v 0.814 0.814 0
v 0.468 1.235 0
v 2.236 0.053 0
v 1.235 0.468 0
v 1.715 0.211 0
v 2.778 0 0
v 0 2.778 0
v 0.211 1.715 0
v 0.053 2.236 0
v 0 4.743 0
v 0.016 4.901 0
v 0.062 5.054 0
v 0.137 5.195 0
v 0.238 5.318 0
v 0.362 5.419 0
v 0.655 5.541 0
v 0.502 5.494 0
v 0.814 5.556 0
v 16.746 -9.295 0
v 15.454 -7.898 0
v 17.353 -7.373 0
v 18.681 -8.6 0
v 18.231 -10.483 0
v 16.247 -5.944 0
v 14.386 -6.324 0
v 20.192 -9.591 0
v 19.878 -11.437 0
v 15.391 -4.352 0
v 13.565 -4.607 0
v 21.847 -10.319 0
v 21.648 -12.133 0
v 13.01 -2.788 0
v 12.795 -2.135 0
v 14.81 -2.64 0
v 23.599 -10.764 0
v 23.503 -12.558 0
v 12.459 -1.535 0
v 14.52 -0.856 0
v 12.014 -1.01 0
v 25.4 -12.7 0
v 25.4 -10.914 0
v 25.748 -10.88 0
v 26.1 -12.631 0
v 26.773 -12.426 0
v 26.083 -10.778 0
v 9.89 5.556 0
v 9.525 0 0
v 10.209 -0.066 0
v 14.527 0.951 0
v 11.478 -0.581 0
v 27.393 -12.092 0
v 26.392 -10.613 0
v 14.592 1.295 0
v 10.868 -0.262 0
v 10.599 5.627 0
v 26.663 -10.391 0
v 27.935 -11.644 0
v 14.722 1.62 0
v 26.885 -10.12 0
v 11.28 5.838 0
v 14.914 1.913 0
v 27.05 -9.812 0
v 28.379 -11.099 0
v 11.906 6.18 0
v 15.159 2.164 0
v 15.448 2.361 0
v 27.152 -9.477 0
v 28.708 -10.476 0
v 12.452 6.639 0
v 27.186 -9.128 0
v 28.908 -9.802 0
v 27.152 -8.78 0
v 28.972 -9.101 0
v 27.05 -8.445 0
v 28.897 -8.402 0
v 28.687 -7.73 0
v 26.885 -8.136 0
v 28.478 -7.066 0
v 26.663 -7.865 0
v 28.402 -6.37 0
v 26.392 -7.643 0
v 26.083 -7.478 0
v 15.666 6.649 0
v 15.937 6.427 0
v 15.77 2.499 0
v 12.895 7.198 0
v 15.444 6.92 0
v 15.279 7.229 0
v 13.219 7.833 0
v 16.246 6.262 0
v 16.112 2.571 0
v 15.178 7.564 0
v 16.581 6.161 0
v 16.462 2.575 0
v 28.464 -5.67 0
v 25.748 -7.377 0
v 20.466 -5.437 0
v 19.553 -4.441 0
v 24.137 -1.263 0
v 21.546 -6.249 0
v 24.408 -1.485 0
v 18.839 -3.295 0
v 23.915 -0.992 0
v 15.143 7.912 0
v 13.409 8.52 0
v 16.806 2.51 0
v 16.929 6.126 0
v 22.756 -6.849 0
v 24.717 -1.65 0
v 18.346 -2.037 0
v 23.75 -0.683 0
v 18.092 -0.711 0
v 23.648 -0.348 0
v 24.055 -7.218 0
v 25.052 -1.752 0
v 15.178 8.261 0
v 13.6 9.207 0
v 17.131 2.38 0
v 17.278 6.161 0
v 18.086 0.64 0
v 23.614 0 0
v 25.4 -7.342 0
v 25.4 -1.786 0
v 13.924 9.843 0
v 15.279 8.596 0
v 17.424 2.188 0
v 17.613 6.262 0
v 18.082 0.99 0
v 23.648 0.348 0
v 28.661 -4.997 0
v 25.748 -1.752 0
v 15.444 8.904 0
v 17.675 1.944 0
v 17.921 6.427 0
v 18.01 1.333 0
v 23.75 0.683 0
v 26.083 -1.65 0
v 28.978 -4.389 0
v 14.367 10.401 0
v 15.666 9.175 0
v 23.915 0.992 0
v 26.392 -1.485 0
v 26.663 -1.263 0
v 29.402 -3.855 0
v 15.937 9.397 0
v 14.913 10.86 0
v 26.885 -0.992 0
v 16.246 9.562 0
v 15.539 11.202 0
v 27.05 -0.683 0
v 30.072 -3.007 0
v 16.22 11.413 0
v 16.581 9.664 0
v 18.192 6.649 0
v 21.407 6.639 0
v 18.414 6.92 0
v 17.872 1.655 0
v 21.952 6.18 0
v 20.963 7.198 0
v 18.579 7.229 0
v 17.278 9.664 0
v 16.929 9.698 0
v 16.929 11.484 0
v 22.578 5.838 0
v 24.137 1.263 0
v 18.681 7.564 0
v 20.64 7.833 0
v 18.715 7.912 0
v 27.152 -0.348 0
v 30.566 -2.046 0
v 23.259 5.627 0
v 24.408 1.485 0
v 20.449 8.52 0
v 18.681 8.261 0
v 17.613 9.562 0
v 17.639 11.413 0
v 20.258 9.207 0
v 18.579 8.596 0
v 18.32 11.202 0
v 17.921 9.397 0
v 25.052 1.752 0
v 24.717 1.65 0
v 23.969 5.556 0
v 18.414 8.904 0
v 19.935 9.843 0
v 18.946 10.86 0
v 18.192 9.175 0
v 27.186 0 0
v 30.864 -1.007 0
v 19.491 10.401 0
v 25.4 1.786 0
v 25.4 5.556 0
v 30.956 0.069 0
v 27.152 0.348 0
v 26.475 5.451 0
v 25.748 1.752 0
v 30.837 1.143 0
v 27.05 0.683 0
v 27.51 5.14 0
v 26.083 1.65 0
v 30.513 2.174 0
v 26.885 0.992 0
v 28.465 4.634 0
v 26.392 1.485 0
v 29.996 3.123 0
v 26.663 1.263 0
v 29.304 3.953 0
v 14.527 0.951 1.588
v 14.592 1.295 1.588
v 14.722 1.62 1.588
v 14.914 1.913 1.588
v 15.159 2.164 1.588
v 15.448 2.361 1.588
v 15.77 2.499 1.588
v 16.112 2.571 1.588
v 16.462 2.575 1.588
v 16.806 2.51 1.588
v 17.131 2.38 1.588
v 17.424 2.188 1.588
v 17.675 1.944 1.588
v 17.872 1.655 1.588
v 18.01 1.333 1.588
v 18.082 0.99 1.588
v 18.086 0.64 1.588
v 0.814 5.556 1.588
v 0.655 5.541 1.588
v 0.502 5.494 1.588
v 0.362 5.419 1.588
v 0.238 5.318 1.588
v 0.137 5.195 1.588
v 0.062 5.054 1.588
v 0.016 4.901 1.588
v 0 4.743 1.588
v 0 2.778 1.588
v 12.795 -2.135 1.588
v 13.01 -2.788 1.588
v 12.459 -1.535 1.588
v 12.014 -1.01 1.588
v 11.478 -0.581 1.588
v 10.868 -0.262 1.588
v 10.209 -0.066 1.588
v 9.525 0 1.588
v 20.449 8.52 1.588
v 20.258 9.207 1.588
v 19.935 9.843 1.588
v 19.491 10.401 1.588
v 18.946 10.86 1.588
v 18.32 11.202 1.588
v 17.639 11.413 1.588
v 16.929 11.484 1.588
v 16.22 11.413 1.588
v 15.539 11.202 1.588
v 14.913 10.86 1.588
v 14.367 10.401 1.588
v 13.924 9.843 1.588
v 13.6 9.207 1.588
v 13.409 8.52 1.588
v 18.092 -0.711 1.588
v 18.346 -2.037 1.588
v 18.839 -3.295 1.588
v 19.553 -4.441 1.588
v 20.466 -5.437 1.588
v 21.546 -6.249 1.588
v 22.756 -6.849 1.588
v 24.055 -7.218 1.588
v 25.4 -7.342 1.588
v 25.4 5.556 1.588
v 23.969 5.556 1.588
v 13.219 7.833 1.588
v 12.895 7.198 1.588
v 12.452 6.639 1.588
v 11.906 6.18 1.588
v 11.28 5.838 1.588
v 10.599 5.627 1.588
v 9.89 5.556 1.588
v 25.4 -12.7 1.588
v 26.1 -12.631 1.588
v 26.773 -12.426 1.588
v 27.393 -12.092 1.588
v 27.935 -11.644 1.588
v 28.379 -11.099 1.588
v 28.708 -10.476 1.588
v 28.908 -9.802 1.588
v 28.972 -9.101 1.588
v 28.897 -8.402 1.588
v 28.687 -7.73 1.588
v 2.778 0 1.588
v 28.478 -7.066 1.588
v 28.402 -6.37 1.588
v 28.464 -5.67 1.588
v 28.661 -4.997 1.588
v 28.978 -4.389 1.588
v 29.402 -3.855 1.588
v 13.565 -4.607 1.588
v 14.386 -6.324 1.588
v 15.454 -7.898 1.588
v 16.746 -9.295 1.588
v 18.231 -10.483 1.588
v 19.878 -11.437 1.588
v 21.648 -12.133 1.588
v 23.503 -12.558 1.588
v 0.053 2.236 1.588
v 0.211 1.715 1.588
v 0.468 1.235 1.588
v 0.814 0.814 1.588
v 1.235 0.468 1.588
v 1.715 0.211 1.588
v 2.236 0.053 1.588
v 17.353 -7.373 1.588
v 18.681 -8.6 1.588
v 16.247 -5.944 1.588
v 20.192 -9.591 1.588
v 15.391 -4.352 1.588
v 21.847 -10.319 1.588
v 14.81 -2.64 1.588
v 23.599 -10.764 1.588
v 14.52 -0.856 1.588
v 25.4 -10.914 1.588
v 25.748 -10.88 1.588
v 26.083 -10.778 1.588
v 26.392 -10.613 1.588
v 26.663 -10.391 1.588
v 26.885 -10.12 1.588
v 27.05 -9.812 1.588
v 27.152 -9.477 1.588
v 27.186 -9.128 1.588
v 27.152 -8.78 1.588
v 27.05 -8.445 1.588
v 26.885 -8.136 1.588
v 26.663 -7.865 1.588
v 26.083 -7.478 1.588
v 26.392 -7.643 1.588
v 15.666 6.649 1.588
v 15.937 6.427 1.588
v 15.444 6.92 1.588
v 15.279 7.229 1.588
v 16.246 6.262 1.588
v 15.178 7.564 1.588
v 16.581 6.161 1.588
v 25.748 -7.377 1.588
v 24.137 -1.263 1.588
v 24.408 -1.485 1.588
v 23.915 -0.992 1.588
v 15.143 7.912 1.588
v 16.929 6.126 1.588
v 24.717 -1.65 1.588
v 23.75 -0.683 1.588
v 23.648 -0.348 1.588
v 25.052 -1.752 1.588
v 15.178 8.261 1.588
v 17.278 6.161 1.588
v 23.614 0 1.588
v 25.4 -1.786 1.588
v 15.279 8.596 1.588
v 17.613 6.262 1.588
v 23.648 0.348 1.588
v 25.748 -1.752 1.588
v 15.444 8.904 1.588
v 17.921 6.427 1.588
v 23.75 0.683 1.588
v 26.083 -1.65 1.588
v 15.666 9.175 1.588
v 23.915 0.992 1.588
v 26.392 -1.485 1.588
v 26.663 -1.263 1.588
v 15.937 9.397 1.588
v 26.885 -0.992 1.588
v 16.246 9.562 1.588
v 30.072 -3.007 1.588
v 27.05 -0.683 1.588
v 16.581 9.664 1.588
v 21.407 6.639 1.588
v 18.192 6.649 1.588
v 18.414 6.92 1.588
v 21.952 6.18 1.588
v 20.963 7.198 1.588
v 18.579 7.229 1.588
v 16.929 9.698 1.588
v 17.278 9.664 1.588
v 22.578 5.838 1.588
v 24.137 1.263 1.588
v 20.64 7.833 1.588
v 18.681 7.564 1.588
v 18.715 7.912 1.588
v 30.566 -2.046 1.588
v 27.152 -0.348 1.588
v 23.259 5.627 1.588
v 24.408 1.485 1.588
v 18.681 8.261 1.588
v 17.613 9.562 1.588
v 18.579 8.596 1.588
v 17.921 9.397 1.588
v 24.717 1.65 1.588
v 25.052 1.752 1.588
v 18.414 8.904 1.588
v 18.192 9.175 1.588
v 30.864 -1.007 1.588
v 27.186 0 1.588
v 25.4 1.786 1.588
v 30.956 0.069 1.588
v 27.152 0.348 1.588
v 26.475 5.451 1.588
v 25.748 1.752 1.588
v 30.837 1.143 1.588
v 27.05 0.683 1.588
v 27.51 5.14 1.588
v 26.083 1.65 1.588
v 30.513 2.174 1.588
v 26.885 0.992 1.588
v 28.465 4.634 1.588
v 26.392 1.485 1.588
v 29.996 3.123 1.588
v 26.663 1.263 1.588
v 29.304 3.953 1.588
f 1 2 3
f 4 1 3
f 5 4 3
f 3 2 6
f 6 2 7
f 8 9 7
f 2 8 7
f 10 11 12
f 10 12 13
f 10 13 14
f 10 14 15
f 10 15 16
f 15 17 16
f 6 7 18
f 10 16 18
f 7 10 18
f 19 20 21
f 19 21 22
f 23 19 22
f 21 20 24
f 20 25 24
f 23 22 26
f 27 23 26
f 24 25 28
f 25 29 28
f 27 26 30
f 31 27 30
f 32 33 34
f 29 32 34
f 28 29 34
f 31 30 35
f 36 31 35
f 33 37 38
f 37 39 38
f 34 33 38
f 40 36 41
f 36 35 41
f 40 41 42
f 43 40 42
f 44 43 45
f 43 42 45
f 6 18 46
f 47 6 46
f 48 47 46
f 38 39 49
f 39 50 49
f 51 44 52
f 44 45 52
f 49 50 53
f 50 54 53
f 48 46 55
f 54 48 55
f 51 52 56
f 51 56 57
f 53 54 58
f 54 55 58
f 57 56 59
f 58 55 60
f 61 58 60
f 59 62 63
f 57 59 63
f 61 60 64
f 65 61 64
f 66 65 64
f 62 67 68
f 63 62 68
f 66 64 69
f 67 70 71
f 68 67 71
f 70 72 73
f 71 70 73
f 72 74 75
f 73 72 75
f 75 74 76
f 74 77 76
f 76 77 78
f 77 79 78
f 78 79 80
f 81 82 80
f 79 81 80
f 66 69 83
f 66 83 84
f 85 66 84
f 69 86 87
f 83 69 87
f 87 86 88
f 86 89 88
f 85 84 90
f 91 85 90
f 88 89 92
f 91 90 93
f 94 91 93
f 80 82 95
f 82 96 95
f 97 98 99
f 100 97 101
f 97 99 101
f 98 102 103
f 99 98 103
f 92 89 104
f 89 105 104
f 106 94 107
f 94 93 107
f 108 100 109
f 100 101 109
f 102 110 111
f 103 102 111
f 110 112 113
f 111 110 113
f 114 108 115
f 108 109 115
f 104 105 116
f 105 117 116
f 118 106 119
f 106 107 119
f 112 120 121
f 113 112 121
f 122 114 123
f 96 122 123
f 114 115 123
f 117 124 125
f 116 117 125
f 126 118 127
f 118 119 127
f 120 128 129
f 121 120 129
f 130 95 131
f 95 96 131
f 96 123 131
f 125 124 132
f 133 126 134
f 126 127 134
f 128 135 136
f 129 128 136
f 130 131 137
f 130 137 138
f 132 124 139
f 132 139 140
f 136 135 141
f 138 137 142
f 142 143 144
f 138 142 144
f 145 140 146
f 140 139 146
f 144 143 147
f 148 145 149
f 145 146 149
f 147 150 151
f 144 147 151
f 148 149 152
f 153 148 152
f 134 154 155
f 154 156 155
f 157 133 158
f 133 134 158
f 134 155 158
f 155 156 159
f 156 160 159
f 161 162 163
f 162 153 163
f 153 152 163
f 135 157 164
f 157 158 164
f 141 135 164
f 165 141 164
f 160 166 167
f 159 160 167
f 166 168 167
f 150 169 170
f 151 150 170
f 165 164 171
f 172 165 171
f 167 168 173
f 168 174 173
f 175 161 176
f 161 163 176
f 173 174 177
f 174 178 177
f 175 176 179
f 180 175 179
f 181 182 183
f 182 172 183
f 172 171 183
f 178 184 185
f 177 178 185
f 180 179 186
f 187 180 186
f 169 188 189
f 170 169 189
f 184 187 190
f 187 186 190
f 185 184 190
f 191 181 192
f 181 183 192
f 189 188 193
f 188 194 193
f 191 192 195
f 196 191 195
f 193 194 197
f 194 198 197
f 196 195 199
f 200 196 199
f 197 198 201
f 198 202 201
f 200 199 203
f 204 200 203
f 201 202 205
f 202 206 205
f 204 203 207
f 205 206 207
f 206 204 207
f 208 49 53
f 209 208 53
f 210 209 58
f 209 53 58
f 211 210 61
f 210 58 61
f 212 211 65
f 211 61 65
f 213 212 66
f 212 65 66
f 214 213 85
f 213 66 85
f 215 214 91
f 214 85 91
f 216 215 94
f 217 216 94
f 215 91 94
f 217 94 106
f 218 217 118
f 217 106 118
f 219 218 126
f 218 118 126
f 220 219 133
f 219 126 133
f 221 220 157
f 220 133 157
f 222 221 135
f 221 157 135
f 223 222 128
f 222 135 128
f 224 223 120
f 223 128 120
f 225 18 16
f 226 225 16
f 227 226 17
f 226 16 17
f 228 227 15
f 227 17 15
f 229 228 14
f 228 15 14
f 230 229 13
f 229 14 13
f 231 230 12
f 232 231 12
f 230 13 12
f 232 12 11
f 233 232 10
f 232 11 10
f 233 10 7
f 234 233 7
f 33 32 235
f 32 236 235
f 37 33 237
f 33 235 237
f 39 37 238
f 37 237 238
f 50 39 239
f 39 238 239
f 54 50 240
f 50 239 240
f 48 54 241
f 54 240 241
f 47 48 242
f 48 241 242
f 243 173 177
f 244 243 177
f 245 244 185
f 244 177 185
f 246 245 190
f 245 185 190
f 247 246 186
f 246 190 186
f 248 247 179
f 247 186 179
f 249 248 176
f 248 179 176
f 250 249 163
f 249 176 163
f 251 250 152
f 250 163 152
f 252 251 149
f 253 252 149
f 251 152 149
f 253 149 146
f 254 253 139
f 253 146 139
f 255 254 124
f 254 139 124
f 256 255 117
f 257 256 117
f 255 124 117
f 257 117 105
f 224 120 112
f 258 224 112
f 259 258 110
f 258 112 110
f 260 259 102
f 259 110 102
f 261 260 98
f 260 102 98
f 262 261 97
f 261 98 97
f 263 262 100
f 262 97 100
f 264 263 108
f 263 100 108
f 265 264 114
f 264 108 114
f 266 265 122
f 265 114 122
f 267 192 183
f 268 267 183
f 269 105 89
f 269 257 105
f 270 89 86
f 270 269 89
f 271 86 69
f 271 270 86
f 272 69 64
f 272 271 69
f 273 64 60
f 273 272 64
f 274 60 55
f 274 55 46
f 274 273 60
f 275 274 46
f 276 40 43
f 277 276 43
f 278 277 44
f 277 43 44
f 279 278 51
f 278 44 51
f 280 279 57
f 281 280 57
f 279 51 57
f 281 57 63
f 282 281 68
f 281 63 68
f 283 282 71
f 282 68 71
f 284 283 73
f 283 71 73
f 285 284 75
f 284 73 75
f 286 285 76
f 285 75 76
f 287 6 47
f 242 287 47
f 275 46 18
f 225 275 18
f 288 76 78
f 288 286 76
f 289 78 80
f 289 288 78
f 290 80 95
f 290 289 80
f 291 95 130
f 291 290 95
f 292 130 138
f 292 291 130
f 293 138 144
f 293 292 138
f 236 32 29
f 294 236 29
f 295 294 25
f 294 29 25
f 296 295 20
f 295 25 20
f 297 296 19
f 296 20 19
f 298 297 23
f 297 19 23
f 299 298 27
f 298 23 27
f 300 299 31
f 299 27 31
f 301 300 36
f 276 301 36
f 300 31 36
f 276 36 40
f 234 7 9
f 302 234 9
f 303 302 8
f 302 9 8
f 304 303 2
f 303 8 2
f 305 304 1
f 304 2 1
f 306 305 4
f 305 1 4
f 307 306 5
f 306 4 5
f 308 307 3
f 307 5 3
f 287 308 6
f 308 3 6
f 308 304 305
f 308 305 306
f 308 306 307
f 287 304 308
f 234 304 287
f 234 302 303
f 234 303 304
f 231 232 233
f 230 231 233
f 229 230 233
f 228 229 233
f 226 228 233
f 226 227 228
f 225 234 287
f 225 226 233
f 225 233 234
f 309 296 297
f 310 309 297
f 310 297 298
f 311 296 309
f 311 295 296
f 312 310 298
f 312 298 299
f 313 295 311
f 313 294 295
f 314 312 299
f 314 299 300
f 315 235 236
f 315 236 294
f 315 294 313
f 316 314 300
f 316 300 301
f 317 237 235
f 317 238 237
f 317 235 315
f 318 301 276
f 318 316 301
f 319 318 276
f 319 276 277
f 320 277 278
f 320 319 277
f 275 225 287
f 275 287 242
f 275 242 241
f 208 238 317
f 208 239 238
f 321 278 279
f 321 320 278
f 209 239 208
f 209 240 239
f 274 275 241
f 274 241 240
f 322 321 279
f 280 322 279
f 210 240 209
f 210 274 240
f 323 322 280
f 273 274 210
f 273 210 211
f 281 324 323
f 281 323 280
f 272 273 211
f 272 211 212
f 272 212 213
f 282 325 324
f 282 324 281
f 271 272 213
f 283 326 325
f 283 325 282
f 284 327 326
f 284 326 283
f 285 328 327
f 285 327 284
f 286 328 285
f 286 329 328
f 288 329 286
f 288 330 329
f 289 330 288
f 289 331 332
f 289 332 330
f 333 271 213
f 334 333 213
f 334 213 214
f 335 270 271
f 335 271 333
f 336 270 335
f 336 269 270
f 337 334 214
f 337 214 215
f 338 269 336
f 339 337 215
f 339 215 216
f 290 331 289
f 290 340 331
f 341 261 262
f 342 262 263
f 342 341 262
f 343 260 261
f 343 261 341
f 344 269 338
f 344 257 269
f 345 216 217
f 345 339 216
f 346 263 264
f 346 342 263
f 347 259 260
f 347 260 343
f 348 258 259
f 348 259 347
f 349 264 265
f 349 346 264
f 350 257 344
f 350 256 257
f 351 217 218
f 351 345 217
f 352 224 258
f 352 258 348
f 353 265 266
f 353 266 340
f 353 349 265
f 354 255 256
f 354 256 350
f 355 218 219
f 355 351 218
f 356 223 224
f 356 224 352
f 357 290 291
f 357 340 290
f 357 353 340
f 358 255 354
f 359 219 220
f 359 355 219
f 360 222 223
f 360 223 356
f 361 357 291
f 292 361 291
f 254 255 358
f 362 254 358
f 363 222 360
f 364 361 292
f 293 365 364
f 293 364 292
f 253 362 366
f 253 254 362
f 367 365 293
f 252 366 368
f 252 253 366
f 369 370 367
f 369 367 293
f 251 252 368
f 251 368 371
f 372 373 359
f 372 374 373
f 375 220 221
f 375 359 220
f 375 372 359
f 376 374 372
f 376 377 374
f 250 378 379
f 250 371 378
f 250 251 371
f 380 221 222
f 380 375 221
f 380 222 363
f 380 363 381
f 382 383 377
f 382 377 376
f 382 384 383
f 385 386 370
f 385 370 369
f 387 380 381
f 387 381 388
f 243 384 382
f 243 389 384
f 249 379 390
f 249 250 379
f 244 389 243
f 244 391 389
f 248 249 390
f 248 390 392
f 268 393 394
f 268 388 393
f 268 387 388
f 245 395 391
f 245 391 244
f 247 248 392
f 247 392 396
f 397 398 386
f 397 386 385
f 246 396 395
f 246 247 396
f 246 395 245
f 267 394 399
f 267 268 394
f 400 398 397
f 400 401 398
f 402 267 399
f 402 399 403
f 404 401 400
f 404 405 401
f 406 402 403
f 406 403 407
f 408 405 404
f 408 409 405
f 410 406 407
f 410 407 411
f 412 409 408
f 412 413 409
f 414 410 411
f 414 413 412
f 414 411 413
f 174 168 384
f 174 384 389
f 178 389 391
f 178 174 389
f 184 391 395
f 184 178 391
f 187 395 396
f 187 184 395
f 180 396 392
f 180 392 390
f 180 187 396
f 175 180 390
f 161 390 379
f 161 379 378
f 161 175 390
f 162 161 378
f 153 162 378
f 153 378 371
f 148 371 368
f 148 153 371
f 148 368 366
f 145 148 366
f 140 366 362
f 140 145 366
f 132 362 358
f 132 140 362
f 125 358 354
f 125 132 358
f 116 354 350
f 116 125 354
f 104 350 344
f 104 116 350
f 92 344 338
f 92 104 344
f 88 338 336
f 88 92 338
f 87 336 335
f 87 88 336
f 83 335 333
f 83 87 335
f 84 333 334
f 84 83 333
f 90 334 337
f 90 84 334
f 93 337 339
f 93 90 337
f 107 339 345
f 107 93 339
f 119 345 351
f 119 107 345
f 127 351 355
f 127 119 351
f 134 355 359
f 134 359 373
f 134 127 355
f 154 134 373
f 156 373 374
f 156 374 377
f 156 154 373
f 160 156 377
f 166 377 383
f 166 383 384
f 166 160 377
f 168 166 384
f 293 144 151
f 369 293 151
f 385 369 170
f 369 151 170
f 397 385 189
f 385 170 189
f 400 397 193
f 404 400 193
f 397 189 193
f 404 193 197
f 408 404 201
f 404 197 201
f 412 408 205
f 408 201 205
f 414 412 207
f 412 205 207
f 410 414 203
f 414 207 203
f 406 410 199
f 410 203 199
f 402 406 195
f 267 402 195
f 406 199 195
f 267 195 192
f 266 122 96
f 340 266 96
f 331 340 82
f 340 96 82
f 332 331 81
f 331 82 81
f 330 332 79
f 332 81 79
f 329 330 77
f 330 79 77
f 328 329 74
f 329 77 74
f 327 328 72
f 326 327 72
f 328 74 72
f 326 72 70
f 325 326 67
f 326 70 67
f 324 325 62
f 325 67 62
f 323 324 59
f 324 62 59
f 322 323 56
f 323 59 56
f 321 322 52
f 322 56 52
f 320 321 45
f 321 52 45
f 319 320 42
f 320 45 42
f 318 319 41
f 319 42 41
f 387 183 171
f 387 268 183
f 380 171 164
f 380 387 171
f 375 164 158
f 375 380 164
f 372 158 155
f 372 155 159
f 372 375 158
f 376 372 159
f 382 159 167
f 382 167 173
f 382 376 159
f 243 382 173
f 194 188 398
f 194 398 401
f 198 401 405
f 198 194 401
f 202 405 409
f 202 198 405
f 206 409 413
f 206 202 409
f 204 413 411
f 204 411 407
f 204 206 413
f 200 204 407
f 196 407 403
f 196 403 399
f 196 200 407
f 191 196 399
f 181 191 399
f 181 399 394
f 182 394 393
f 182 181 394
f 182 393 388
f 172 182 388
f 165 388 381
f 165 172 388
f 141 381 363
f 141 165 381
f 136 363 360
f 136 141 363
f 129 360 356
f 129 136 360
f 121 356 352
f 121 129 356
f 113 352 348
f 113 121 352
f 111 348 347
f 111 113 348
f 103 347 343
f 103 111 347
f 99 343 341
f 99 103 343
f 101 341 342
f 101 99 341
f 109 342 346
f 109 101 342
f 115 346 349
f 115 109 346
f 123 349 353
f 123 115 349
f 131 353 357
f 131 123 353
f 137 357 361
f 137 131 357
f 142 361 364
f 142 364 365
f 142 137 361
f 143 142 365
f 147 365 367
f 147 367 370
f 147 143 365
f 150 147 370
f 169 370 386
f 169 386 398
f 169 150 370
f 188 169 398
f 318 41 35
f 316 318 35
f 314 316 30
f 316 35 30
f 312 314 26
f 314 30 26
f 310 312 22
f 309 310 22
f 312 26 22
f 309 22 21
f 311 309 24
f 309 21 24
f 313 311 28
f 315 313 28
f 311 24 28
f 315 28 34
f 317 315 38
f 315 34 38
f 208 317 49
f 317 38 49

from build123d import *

# Parameters (mm, degrees)
SKETCH1_R           = 1.7859375
BOSS_EXTRUDE1_DEPTH = 1.5875
FILLET1_R           = 3.571875


with BuildPart() as part:
    # Sketch1 → Boss-Extrude1 (new body)
    with BuildSketch(Plane.XY):
        with BuildLine():
            ThreePointArc((25.4, -12.7), (28.971875, -9.128125), (25.4, -5.55625))
            ThreePointArc((25.4, -5.55625), (30.95625, 0), (25.4, 5.55625))
            Line((25.4, 5.55625), (19.614019559, 5.55625))
            ThreePointArc((19.614019559, 5.55625), (16.929229109, 11.484009389), (14.244438658, 5.55625))
            Line((14.244438658, 5.55625), (0.813693974, 5.55625))
            ThreePointArc((0.813693974, 5.55625), (0.238325447, 5.317924553), (0, 4.742556026))
            Line((0, 4.742556026), (0, 2.778125))
            ThreePointArc((0, 2.778125), (0.813693974, 0.813693974), (2.778125, 0))
            Line((2.778125, 0), (12.7, 0))
            ThreePointArc((12.7, 0), (16.419743879, -8.980256121), (25.4, -12.7))
        make_face()
        with BuildLine():
            ThreePointArc((18.08575174, 0.639913805), (19.986771554, -4.960309977), (25.4, -7.3421875))
            ThreePointArc((25.4, -7.3421875), (27.1859375, -9.128125), (25.4, -10.9140625))
            ThreePointArc((25.4, -10.9140625), (17.353309066, -7.37343375), (14.527468803, 0.951223224))
            ThreePointArc((14.527468803, 0.951223224), (16.462264981, 2.574709983), (18.08575174, 0.639913805))
        make_face(mode=Mode.SUBTRACT)
        with Locations((25.4, 0)):
            Circle(SKETCH1_R, mode=Mode.SUBTRACT)
        with Locations((16.929229109, 7.912134389)):
            Circle(SKETCH1_R, mode=Mode.SUBTRACT)
    extrude(amount=BOSS_EXTRUDE1_DEPTH)

    # Fillet1
    fillet1_edges = [part.edges().sort_by_distance(p)[0] for p in [
        (14.244438658, 5.55625, 0.79375),
        (19.614019559, 5.55625, 0.79375),
        (25.4, -5.55625, 0.79375),
        (12.7, 0, 0.79375),
    ]]
    fillet(fillet1_edges, radius=FILLET1_R)


solid = part.part
